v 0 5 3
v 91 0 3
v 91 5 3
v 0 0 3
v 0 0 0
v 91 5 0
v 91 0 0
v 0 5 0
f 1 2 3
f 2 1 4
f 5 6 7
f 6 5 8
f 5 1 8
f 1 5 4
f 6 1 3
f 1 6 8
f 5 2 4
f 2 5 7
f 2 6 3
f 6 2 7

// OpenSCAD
translate([1.0, 2.5, 1.5]) color([0.21057650988664645, 0.8007465903541809, 0.9369691586445807]) cube([2, 5, 3], center=true);
translate([3.0, 2.5, 1.5]) color([0.022782575668658378, 0.42561883196681716, 0.10150021937416975]) cube([2, 5, 3], center=true);
translate([5.0, 2.5, 1.5]) color([0.259919889792832, 0.22082927131631735, 0.6469257198353225]) cube([2, 5, 3], center=true);
translate([7.0, 2.5, 1.5]) color([0.3502939673965323, 0.18031790152968785, 0.5036365052098872]) cube([2, 5, 3], center=true);
translate([9.0, 2.5, 1.5]) color([0.03937870708469238, 0.10092124118896661, 0.9882351487225011]) cube([2, 5, 3], center=true);
translate([11.0, 2.5, 1.5]) color([0.19935579046706298, 0.35855530131160185, 0.7315983062253606]) cube([2, 5, 3], center=true);
translate([13.0, 2.5, 1.5]) color([0.8383265651934163, 0.9184820619953314, 0.16942460609746768]) cube([2, 5, 3], center=true);
translate([17.5, 2.5, 1.5]) color([0.6726405635730526, 0.9665489030431832, 0.05805094382649867]) cube([7, 5, 3], center=true);
translate([24.5, 2.5, 1.5]) color([0.6762017842993783, 0.8454245937016164, 0.342312541078584]) cube([7, 5, 3], center=true);
translate([31.5, 2.5, 1.5]) color([0.25068733928511167, 0.596791393469411, 0.44231403369907896]) cube([7, 5, 3], center=true);
translate([38.5, 2.5, 1.5]) color([0.17481948445144113, 0.47162541509628797, 0.40990539565755457]) cube([7, 5, 3], center=true);
translate([45.5, 2.5, 1.5]) color([0.5691127395242802, 0.5086001300626332, 0.3114460010002068]) cube([7, 5, 3], center=true);
translate([52.5, 2.5, 1.5]) color([0.35715168259026286, 0.837661174368979, 0.25093266482213705]) cube([7, 5, 3], center=true);
translate([59.5, 2.5, 1.5]) color([0.560600218853524, 0.012436318829314397, 0.7415743774106636]) cube([7, 5, 3], center=true);
translate([66.5, 2.5, 1.5]) color([0.3359165544734606, 0.04569649356841665, 0.28088316421834825]) cube([7, 5, 3], center=true);
translate([73.5, 2.5, 1.5]) color([0.24013040782635398, 0.9531293398277989, 0.35222556151550743]) cube([7, 5, 3], center=true);
translate([80.5, 2.5, 1.5]) color([0.2878779148564, 0.35920119725374633, 0.9469058356578911]) cube([7, 5, 3], center=true);
translate([87.5, 2.5, 1.5]) color([0.6337478522492526, 0.6210768456186673, 0.7156193503014563]) cube([7, 5, 3], center=true);
